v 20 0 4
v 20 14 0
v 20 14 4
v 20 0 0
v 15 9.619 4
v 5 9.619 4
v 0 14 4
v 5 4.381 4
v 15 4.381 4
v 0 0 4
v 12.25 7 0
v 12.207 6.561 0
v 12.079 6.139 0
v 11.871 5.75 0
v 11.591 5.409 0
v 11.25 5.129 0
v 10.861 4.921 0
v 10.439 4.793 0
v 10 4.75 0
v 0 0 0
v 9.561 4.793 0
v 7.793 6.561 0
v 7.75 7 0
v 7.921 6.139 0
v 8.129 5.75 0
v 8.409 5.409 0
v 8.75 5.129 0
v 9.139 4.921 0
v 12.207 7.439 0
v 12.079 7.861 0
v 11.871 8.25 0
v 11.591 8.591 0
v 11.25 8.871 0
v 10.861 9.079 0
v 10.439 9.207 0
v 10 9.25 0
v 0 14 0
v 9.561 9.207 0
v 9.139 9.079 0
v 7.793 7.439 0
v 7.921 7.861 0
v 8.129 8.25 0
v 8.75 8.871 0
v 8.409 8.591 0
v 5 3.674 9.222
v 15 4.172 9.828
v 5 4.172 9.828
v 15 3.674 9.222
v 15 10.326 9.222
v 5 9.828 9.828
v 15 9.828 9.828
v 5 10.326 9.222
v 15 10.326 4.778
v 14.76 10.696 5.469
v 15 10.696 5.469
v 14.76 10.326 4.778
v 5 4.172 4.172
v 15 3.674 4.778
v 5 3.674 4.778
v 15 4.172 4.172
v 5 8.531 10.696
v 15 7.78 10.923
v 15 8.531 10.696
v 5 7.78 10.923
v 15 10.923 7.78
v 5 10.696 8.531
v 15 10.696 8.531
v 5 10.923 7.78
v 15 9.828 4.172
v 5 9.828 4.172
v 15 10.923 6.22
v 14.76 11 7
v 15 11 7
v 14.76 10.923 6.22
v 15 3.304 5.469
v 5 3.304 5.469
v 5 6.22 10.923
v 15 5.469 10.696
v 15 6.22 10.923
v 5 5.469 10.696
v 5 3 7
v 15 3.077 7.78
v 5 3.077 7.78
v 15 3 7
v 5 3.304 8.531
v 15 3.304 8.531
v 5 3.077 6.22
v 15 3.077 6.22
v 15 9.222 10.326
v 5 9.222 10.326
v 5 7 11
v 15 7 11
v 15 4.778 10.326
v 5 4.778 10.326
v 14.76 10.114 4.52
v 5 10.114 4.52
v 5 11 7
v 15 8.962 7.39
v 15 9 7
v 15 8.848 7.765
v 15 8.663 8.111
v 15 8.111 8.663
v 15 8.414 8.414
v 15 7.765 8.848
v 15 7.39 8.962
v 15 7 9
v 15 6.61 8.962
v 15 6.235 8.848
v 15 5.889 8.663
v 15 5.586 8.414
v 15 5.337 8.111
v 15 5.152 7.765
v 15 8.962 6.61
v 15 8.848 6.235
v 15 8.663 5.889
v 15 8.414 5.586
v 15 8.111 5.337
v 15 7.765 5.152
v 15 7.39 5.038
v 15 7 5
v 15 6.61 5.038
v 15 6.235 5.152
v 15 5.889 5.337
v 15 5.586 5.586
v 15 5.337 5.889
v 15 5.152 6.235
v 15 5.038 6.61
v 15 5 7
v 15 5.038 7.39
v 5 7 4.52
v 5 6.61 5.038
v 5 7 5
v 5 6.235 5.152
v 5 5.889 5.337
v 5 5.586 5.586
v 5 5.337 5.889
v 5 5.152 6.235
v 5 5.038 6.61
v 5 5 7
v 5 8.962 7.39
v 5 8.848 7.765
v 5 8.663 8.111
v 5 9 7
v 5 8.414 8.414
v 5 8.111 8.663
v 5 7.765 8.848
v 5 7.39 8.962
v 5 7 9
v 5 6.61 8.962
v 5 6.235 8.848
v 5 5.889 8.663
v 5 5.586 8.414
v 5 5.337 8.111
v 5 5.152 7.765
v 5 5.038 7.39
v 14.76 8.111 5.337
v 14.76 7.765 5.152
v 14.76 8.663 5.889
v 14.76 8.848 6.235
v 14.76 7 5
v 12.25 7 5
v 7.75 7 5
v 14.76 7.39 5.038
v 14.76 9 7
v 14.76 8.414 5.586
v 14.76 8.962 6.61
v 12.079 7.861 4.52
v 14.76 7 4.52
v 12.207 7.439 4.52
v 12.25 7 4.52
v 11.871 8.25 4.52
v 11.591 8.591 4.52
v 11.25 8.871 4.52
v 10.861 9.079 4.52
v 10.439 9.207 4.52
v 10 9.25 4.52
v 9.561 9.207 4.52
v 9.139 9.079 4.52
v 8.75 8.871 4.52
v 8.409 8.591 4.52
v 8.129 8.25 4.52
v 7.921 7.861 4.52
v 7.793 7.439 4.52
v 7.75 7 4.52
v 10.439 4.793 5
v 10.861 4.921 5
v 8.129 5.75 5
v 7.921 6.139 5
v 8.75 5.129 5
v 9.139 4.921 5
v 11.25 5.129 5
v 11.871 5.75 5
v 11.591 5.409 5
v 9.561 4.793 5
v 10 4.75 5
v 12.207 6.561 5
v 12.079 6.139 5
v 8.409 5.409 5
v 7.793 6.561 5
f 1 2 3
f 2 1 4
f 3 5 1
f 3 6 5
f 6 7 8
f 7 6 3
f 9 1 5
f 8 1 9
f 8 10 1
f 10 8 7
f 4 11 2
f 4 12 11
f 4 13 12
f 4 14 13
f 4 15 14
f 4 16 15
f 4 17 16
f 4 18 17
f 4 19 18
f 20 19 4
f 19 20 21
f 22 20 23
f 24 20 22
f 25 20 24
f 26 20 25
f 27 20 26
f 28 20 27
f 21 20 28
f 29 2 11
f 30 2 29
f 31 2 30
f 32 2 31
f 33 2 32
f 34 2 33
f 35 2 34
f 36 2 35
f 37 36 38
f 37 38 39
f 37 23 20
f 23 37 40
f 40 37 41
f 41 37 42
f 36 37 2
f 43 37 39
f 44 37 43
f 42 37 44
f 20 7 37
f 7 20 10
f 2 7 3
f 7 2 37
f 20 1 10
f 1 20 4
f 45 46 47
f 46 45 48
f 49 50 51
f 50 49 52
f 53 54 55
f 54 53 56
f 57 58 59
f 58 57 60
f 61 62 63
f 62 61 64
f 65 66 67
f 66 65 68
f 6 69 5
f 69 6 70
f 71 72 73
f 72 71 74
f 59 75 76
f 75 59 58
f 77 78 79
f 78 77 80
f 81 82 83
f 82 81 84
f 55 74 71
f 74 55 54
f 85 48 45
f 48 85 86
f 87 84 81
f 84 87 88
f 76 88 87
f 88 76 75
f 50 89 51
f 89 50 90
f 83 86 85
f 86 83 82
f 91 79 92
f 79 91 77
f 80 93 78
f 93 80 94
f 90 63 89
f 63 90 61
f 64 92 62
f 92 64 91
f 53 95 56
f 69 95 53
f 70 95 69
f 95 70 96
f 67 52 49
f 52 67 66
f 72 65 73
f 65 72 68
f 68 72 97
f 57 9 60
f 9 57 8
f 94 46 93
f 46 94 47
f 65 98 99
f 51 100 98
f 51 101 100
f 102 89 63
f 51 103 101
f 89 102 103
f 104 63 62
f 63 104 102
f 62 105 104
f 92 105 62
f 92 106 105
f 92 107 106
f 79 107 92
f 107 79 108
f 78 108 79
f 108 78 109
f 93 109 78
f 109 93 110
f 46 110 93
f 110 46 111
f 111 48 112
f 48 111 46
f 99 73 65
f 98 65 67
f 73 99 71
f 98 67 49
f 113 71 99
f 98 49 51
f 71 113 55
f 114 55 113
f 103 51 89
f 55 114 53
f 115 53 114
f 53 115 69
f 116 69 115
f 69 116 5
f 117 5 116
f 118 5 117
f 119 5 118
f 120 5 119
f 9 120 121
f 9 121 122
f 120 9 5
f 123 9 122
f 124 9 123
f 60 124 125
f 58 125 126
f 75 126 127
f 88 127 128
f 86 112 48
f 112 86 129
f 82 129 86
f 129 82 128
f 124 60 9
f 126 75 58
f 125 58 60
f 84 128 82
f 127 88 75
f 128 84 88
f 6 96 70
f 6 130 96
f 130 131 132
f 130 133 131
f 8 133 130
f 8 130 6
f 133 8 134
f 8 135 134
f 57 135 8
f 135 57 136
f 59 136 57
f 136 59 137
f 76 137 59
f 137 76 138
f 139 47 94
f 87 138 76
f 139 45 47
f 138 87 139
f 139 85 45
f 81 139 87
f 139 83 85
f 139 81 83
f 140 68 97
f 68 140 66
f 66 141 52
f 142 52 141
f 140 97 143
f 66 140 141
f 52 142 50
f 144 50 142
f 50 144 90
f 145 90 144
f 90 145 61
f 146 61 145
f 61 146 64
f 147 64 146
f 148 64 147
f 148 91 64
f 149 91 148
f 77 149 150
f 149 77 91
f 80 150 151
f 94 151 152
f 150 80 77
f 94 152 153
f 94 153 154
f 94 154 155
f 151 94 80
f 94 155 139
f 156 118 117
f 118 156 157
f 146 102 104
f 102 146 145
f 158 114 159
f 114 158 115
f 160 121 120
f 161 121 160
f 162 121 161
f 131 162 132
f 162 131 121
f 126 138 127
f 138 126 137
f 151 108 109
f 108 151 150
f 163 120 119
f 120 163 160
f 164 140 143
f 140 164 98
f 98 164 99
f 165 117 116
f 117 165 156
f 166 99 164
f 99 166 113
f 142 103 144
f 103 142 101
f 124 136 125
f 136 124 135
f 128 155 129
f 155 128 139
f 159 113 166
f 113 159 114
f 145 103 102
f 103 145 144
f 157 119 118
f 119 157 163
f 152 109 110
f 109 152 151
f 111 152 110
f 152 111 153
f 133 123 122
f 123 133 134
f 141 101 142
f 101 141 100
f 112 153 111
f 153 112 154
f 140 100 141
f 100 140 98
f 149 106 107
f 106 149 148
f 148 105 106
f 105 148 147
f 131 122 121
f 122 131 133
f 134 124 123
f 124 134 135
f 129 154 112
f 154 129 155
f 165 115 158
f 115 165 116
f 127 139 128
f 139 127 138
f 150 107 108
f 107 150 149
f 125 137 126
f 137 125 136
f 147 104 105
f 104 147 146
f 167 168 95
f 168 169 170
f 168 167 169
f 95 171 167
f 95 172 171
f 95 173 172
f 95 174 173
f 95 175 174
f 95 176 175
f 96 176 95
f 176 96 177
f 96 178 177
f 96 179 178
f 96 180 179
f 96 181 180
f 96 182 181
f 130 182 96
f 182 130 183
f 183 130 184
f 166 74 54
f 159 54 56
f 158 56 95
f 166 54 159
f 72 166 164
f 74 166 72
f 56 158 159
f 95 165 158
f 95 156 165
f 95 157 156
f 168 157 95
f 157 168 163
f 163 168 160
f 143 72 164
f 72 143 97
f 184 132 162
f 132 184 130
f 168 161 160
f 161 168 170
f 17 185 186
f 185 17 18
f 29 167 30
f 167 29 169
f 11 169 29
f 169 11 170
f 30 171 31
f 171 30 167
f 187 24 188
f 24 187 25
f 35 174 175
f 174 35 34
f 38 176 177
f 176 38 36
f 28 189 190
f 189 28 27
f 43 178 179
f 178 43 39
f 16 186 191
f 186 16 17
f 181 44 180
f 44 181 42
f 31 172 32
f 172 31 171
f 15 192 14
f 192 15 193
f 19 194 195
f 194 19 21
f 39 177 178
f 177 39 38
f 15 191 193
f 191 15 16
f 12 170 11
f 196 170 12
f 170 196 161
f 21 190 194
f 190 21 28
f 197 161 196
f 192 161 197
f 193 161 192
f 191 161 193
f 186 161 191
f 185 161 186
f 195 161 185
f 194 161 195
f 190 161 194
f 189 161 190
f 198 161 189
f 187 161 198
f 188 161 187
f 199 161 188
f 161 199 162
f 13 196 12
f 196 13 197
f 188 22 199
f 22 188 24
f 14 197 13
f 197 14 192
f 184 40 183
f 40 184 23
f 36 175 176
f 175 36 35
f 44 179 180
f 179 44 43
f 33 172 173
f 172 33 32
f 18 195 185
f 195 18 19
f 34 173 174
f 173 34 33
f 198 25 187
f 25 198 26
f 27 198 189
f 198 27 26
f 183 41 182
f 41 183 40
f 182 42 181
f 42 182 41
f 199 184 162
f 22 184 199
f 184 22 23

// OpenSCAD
$fn = 32;

// ----------------------------------------------------------------------
// Cable clip: cable 4 mm, clamp 8 mm, base 20 mm
// ----------------------------------------------------------------------

// --- parameters (mm) ---
foot_w = 20;              // base length, X
foot_d = 14;              // base width, Y
foot_t = 4;               // base thickness
hose_seat_d = 8;          // clamp outside diameter
ring_t = 2;               // clamp wall
cable_d = 4;              // cable opening
ring_w = 10;              // clamp width along the cable
screw_d = 4.5;            // screw clearance
throat = 2.48;            // snap throat width
sink = 1;                 // overlap of the clamp into the base

module base() {
  cube([foot_w, foot_d, foot_t]);
}

module clamp() {
  translate([foot_w / 2, foot_d / 2, foot_t + hose_seat_d / 2 - sink]) rotate([0, 90, 0])
    cylinder(h = ring_w, d = hose_seat_d, center = true);
}

difference() {
  union() {
    base();
    clamp();
  }
  translate([foot_w / 2, foot_d / 2, foot_t + hose_seat_d / 2 - sink]) rotate([0, 90, 0]) translate([0, 0, -ring_w / 2 - 1]) cylinder(h = ring_w + 2, d = cable_d);
  /* snap throat: the opening is narrower than the cable */
  translate([foot_w / 2 - throat / 2, foot_d / 2, foot_t + hose_seat_d / 2 - sink]) rotate([0, 90, 0]) translate([0, 0, -ring_w / 2 - 1]) cube([throat, hose_seat_d + 2, ring_w + 2]);
  translate([10, foot_d / 2, -1]) cylinder(h = foot_t + 2, d = screw_d);
}
